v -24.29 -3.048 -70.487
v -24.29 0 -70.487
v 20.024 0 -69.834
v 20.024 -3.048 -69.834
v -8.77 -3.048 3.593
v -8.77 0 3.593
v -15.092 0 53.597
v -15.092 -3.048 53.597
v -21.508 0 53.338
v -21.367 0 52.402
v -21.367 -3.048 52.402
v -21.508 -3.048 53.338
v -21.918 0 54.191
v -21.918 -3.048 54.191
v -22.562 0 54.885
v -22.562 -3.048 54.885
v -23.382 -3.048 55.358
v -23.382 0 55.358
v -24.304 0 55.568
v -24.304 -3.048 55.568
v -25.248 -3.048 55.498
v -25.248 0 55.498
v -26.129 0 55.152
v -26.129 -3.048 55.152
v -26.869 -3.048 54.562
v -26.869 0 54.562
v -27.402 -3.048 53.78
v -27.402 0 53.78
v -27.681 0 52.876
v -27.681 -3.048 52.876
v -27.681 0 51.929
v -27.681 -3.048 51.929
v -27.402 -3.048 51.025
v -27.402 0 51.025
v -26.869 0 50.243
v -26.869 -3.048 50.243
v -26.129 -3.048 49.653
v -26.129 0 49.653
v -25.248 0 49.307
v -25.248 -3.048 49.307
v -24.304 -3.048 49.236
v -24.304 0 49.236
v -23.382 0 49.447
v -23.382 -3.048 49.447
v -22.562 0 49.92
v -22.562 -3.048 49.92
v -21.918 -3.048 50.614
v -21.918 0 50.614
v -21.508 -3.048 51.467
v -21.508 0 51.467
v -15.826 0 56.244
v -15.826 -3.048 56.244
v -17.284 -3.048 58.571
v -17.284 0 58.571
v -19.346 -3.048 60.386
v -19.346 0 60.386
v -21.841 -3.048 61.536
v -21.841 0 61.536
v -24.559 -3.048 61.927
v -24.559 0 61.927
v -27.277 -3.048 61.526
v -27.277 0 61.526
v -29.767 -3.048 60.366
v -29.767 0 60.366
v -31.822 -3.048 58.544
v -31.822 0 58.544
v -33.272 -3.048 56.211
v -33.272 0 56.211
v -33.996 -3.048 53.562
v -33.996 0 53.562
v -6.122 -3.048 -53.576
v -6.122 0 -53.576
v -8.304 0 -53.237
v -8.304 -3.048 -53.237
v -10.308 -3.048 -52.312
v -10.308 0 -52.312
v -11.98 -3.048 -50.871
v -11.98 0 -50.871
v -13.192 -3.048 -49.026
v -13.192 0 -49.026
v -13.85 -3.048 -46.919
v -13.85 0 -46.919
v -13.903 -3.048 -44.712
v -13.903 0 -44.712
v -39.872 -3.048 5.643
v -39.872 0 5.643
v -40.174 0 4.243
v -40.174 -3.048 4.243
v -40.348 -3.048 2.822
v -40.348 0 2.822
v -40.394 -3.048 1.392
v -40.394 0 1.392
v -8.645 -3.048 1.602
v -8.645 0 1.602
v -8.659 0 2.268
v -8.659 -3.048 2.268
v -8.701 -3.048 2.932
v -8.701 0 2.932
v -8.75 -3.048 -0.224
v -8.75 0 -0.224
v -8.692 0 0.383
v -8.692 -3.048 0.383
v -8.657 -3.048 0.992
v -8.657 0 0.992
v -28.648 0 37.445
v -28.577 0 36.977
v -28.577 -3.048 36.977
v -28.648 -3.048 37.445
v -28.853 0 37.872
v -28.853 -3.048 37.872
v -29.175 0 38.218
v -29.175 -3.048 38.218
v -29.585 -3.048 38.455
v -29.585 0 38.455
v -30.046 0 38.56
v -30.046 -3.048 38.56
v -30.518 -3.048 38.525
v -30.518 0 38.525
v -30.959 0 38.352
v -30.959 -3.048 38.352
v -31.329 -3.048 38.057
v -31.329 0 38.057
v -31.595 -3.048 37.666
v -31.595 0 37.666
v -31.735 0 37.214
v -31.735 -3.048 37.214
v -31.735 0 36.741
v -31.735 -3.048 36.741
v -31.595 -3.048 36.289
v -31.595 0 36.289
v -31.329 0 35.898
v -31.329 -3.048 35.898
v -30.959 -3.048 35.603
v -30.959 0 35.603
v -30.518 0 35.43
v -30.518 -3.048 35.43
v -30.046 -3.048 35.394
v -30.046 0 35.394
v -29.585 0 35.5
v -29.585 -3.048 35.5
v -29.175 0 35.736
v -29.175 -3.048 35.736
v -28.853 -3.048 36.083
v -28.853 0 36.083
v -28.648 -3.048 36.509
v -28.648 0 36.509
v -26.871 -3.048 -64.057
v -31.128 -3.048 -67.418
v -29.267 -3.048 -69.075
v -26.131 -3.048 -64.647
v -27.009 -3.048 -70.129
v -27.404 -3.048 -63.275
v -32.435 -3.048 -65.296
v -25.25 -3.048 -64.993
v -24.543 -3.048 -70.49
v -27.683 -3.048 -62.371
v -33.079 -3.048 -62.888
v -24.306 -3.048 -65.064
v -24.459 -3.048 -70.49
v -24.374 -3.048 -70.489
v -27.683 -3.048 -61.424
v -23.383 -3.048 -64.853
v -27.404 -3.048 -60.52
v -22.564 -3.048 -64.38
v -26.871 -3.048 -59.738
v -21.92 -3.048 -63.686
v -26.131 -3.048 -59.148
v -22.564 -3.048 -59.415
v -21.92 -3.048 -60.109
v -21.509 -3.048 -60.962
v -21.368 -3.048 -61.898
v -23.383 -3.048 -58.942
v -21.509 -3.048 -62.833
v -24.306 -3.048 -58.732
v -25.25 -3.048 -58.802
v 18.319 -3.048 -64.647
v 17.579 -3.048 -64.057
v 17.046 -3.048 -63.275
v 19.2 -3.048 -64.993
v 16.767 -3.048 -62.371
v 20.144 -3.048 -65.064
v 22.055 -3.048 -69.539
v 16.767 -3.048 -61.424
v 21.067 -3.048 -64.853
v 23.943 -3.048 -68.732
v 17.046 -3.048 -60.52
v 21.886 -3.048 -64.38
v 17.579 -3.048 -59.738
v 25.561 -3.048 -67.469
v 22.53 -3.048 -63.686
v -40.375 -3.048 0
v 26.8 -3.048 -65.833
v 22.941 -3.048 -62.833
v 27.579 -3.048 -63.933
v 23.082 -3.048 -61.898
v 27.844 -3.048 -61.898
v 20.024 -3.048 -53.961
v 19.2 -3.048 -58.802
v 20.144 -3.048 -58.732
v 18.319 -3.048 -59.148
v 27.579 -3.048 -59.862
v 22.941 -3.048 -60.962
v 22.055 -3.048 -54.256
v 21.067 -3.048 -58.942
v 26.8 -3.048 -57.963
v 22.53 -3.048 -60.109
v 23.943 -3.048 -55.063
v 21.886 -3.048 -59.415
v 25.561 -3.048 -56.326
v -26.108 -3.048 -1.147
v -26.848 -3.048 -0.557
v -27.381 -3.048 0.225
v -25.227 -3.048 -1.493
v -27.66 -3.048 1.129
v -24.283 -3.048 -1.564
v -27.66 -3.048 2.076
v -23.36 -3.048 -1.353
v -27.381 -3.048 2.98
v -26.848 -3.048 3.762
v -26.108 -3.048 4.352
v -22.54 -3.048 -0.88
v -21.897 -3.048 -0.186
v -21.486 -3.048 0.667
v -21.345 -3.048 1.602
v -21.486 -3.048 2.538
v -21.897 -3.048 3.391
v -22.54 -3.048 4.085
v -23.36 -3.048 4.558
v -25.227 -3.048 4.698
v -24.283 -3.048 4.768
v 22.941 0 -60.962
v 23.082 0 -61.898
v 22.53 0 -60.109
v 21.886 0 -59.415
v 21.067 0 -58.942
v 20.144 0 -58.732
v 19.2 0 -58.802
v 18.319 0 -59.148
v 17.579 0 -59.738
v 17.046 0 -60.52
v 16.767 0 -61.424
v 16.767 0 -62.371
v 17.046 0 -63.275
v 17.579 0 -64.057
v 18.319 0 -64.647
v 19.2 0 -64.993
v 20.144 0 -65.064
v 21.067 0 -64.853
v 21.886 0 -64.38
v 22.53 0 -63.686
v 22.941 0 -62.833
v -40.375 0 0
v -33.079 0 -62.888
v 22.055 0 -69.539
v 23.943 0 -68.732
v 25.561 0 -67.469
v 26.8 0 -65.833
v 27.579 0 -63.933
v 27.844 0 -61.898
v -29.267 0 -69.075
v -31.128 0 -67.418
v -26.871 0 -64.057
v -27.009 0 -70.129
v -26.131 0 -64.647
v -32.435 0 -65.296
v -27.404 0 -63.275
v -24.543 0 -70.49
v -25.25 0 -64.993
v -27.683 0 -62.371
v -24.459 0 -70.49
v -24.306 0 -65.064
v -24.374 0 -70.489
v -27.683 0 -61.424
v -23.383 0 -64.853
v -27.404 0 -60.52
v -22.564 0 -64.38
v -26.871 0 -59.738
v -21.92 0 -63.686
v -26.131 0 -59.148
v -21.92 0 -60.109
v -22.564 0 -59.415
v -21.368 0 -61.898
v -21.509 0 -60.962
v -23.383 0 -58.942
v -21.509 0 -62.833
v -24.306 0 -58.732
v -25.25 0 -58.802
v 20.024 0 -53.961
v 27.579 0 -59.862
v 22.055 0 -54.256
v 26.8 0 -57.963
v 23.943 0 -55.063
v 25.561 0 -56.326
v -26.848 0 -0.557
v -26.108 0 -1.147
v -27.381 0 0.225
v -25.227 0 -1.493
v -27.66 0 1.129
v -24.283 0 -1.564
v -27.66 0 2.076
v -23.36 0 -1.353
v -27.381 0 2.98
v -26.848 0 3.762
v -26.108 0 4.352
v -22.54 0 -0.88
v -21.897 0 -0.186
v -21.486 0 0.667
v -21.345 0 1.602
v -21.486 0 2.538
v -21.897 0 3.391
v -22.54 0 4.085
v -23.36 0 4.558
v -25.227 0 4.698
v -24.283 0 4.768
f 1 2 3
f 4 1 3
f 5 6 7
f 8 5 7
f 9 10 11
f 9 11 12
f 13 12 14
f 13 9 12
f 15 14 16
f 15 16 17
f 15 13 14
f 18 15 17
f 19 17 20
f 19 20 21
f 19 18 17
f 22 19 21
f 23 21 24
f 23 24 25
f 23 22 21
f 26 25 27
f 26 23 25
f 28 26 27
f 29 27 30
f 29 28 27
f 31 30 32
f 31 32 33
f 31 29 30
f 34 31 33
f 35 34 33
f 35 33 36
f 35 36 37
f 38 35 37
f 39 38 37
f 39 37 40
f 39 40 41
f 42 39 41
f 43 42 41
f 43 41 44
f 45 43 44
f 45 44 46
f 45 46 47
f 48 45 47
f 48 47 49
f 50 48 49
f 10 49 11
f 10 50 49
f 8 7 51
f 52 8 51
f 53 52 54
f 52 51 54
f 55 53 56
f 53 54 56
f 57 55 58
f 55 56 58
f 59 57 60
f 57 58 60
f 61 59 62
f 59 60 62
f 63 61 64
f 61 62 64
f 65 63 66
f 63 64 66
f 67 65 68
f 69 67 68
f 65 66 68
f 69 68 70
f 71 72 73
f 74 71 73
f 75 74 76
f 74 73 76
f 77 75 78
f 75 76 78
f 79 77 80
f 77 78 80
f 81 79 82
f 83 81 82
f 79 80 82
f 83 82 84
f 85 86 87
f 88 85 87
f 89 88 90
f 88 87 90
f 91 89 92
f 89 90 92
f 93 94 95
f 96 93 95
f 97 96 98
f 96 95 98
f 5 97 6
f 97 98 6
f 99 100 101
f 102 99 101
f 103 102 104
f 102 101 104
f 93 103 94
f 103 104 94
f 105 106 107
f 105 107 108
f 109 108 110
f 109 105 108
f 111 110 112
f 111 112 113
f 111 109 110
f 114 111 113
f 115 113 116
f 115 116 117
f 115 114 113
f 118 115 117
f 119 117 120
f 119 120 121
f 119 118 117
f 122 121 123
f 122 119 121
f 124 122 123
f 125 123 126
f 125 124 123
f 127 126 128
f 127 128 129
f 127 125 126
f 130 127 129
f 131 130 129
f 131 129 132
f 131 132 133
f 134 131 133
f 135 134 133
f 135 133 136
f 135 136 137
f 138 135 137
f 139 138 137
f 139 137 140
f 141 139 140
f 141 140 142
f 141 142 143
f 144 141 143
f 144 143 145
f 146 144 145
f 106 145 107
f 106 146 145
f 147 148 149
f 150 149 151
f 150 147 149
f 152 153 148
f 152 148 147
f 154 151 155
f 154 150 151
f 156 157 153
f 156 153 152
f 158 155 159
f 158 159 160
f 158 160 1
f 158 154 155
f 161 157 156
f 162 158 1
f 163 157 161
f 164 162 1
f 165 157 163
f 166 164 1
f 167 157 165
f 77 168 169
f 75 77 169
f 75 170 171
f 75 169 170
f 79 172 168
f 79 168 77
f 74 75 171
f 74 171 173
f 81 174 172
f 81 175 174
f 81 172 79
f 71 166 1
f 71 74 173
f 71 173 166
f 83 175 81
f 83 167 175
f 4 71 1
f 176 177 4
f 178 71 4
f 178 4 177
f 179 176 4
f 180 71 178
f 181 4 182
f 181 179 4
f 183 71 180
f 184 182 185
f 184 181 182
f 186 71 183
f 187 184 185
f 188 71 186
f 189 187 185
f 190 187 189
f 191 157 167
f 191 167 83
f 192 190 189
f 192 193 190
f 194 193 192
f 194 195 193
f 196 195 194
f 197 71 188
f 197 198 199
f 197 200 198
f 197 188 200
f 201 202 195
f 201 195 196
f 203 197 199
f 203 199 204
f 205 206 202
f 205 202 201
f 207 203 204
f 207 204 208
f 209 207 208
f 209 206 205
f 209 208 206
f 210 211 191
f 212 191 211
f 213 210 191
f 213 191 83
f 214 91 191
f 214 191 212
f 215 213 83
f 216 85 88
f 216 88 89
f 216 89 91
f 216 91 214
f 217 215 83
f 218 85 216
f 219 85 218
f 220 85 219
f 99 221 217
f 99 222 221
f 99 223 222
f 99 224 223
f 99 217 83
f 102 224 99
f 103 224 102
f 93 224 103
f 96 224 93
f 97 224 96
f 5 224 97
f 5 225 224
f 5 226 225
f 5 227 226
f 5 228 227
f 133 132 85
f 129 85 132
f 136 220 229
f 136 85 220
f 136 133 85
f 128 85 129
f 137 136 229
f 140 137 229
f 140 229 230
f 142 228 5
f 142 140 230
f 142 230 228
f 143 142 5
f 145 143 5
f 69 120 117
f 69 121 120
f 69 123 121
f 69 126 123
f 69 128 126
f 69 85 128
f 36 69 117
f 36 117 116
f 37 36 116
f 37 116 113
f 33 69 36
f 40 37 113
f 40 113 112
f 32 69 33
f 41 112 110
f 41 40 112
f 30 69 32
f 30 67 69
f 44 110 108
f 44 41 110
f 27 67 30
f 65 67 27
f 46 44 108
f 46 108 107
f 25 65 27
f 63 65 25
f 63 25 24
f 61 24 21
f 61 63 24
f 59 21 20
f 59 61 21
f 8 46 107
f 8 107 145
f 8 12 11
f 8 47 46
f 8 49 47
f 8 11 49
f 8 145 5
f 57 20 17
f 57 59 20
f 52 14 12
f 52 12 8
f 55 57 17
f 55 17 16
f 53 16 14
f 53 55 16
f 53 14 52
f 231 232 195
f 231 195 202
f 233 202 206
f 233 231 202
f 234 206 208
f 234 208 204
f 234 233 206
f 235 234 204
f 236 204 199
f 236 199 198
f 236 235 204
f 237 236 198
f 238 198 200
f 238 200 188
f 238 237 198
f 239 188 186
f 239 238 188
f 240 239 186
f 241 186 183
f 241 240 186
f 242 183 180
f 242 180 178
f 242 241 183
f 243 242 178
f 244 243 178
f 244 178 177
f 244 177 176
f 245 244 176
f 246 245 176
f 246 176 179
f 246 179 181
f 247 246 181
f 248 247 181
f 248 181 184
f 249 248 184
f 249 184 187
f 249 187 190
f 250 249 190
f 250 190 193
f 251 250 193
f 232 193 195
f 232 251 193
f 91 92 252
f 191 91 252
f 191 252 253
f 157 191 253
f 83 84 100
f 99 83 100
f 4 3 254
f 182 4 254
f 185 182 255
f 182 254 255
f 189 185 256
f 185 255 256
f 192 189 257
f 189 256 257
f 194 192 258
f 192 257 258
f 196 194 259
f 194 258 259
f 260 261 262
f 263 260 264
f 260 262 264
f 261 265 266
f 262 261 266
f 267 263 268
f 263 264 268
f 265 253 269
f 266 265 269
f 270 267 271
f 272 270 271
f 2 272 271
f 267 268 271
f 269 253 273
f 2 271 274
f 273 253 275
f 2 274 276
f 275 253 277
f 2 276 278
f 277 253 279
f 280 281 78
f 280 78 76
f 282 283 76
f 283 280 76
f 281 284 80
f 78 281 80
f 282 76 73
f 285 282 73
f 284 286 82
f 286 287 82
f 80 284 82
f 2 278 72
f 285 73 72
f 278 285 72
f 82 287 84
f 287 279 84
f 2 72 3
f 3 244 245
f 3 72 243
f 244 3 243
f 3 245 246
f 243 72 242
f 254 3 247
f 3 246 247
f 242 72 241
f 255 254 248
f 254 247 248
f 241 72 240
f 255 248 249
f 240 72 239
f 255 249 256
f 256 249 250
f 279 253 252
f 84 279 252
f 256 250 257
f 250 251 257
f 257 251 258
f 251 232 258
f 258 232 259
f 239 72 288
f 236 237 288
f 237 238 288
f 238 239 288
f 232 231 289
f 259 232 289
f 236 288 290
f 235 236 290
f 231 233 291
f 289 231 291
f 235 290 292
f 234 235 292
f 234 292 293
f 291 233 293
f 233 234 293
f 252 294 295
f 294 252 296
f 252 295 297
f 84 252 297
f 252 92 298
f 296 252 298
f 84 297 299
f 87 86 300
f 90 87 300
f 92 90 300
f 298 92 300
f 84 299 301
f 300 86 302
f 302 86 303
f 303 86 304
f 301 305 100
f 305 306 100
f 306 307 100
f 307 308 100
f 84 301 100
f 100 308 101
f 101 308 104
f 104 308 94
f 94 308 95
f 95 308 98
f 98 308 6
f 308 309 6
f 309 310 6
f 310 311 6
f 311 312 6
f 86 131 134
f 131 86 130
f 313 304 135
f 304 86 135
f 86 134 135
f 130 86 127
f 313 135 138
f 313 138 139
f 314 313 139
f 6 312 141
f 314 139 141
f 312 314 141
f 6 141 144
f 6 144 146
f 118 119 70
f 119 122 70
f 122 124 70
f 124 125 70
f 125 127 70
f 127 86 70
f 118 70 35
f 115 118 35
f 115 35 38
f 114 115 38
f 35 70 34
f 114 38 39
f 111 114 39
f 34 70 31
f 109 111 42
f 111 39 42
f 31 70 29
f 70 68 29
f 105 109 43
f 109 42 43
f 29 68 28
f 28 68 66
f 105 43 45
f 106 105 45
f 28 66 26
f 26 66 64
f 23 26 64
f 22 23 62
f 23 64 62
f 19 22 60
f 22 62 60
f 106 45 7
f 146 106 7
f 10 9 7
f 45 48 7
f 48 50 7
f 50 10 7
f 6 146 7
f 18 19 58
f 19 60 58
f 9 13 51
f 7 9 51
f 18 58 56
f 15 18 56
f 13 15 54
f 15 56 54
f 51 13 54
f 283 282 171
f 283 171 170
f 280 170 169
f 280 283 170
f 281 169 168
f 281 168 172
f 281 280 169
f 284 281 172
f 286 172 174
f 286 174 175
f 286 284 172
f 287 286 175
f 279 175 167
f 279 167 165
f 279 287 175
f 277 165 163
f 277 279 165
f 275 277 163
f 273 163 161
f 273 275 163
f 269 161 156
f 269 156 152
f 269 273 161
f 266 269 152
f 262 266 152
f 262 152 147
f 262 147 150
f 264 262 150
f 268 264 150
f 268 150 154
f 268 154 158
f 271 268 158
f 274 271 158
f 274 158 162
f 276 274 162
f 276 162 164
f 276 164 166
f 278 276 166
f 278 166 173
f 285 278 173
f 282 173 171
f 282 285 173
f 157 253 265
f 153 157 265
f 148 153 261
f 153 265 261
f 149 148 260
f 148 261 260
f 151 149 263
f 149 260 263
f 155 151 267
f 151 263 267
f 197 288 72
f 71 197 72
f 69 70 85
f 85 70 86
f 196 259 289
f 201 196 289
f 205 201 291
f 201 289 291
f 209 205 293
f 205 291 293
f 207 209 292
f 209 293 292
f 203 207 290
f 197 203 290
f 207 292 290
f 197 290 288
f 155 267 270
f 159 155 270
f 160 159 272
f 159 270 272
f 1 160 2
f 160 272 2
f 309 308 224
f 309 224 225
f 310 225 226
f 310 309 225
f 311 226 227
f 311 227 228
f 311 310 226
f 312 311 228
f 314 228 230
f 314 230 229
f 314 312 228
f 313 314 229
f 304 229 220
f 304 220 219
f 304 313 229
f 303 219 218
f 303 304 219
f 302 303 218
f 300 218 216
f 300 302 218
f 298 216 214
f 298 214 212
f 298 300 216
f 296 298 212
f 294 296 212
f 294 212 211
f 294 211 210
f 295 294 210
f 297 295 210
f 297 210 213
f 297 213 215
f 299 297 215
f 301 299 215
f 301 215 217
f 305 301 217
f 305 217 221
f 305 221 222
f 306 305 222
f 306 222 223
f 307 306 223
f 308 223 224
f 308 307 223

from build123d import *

# Parameters (mm, degrees)
F0_R     = 3.175
F0_R_2   = 1.5875
F1_DEPTH = 3.048


with BuildPart() as f1:
    # F0 (on Front) → F1 (new body)
    with BuildSketch(Plane.XZ):
        with BuildLine():
            Line((-39.872363, 5.642511), (-40.393674, 1.391583))
            ThreePointArc((-40.393674, 1.391583), (-25.329494, -14.251993), (-8.750471, -0.223914))
            ThreePointArc((-8.750471, -0.223914), (-8.671445, 0.687703), (-8.645073, 1.602358))
            ThreePointArc((-8.645073, 1.602358), (-8.676443, 2.599858), (-8.770428, 3.593415))
            ThreePointArc((-8.770428, 3.593415), (-23.476439, 17.443016), (-39.872363, 5.642511))
        make_face()
        with Locations((-24.520073, 1.602358)):
            Circle(F0_R, mode=Mode.SUBTRACT)
        with BuildLine():
            ThreePointArc((-39.872363, 5.642511), (-40.277029, 3.534708), (-40.393674, 1.391583))
            Line((-40.393674, 1.391583), (-39.872363, 5.642511))
        make_face()
        with BuildLine():
            ThreePointArc((-8.750471, -0.223914), (-25.329494, -14.251993), (-40.393674, 1.391583))
            Line((-40.393674, 1.391583), (-40.375196, 0))
            Line((-40.375196, 0), (-33.078623, -62.887975))
            ThreePointArc((-33.078623, -62.887975), (-25.039092, -53.319184), (-15.950314, -61.897642))
            ThreePointArc((-15.950314, -61.897642), (-18.378295, -67.883554), (-24.290135, -70.486702))
            Line((-24.290135, -70.486702), (20.023751, -69.834282))
            ThreePointArc((20.023751, -69.834282), (11.969402, -61.897642), (20.023751, -53.961002))
            Line((20.023751, -53.961002), (-6.122254, -53.576062))
            ThreePointArc((-6.122254, -53.576062), (-11.980182, -50.87129), (-13.902635, -44.712127))
            Line((-13.902635, -44.712127), (-8.750471, -0.223914))
        make_face()
        with BuildLine():
            Line((-33.995798, 53.561768), (-39.872363, 5.642511))
            ThreePointArc((-39.872363, 5.642511), (-23.476439, 17.443016), (-8.770428, 3.593415))
            Line((-8.770428, 3.593415), (-15.091838, 53.596992))
            ThreePointArc((-15.091838, 53.596992), (-15.035447, 53.000858), (-15.016625, 52.402358))
            ThreePointArc((-15.016625, 52.402358), (-25.12241, 42.895081), (-33.995798, 53.561768))
        make_face()
        with Locations((-30.164933, 36.977328)):
            Circle(F0_R_2, mode=Mode.SUBTRACT)
        with BuildLine():
            ThreePointArc((-15.091838, 53.596992), (-24.559373, 61.927342), (-33.995798, 53.561768))
            ThreePointArc((-33.995798, 53.561768), (-25.12241, 42.895081), (-15.016625, 52.402358))
            ThreePointArc((-15.016625, 52.402358), (-15.035447, 53.000858), (-15.091838, 53.596992))
        make_face()
        with Locations((-24.541625, 52.402358)):
            Circle(F0_R, mode=Mode.SUBTRACT)
        with BuildLine():
            ThreePointArc((-15.950314, -61.897642), (-25.039092, -53.319184), (-33.078623, -62.887975))
            ThreePointArc((-33.078623, -62.887975), (-30.258263, -68.314248), (-24.543098, -70.490426))
            Line((-24.543098, -70.490426), (-24.290135, -70.486702))
            ThreePointArc((-24.290135, -70.486702), (-18.378295, -67.883554), (-15.950314, -61.897642))
        make_face()
        with Locations((-24.543098, -61.897642)):
            Circle(F0_R, mode=Mode.SUBTRACT)
        with BuildLine():
            Line((-24.290135, -70.486702), (-24.543098, -70.490426))
            ThreePointArc((-24.543098, -70.490426), (-24.416603, -70.489495), (-24.290135, -70.486702))
        make_face()
        with BuildLine():
            ThreePointArc((27.844402, -61.897642), (25.560723, -56.326447), (20.023751, -53.961002))
            ThreePointArc((20.023751, -53.961002), (11.969402, -61.897642), (20.023751, -69.834282))
            ThreePointArc((20.023751, -69.834282), (25.560723, -67.468837), (27.844402, -61.897642))
        make_face()
        with Locations((19.906902, -61.897642)):
            Circle(F0_R, mode=Mode.SUBTRACT)
    extrude(amount=F1_DEPTH)


solid = f1.part
